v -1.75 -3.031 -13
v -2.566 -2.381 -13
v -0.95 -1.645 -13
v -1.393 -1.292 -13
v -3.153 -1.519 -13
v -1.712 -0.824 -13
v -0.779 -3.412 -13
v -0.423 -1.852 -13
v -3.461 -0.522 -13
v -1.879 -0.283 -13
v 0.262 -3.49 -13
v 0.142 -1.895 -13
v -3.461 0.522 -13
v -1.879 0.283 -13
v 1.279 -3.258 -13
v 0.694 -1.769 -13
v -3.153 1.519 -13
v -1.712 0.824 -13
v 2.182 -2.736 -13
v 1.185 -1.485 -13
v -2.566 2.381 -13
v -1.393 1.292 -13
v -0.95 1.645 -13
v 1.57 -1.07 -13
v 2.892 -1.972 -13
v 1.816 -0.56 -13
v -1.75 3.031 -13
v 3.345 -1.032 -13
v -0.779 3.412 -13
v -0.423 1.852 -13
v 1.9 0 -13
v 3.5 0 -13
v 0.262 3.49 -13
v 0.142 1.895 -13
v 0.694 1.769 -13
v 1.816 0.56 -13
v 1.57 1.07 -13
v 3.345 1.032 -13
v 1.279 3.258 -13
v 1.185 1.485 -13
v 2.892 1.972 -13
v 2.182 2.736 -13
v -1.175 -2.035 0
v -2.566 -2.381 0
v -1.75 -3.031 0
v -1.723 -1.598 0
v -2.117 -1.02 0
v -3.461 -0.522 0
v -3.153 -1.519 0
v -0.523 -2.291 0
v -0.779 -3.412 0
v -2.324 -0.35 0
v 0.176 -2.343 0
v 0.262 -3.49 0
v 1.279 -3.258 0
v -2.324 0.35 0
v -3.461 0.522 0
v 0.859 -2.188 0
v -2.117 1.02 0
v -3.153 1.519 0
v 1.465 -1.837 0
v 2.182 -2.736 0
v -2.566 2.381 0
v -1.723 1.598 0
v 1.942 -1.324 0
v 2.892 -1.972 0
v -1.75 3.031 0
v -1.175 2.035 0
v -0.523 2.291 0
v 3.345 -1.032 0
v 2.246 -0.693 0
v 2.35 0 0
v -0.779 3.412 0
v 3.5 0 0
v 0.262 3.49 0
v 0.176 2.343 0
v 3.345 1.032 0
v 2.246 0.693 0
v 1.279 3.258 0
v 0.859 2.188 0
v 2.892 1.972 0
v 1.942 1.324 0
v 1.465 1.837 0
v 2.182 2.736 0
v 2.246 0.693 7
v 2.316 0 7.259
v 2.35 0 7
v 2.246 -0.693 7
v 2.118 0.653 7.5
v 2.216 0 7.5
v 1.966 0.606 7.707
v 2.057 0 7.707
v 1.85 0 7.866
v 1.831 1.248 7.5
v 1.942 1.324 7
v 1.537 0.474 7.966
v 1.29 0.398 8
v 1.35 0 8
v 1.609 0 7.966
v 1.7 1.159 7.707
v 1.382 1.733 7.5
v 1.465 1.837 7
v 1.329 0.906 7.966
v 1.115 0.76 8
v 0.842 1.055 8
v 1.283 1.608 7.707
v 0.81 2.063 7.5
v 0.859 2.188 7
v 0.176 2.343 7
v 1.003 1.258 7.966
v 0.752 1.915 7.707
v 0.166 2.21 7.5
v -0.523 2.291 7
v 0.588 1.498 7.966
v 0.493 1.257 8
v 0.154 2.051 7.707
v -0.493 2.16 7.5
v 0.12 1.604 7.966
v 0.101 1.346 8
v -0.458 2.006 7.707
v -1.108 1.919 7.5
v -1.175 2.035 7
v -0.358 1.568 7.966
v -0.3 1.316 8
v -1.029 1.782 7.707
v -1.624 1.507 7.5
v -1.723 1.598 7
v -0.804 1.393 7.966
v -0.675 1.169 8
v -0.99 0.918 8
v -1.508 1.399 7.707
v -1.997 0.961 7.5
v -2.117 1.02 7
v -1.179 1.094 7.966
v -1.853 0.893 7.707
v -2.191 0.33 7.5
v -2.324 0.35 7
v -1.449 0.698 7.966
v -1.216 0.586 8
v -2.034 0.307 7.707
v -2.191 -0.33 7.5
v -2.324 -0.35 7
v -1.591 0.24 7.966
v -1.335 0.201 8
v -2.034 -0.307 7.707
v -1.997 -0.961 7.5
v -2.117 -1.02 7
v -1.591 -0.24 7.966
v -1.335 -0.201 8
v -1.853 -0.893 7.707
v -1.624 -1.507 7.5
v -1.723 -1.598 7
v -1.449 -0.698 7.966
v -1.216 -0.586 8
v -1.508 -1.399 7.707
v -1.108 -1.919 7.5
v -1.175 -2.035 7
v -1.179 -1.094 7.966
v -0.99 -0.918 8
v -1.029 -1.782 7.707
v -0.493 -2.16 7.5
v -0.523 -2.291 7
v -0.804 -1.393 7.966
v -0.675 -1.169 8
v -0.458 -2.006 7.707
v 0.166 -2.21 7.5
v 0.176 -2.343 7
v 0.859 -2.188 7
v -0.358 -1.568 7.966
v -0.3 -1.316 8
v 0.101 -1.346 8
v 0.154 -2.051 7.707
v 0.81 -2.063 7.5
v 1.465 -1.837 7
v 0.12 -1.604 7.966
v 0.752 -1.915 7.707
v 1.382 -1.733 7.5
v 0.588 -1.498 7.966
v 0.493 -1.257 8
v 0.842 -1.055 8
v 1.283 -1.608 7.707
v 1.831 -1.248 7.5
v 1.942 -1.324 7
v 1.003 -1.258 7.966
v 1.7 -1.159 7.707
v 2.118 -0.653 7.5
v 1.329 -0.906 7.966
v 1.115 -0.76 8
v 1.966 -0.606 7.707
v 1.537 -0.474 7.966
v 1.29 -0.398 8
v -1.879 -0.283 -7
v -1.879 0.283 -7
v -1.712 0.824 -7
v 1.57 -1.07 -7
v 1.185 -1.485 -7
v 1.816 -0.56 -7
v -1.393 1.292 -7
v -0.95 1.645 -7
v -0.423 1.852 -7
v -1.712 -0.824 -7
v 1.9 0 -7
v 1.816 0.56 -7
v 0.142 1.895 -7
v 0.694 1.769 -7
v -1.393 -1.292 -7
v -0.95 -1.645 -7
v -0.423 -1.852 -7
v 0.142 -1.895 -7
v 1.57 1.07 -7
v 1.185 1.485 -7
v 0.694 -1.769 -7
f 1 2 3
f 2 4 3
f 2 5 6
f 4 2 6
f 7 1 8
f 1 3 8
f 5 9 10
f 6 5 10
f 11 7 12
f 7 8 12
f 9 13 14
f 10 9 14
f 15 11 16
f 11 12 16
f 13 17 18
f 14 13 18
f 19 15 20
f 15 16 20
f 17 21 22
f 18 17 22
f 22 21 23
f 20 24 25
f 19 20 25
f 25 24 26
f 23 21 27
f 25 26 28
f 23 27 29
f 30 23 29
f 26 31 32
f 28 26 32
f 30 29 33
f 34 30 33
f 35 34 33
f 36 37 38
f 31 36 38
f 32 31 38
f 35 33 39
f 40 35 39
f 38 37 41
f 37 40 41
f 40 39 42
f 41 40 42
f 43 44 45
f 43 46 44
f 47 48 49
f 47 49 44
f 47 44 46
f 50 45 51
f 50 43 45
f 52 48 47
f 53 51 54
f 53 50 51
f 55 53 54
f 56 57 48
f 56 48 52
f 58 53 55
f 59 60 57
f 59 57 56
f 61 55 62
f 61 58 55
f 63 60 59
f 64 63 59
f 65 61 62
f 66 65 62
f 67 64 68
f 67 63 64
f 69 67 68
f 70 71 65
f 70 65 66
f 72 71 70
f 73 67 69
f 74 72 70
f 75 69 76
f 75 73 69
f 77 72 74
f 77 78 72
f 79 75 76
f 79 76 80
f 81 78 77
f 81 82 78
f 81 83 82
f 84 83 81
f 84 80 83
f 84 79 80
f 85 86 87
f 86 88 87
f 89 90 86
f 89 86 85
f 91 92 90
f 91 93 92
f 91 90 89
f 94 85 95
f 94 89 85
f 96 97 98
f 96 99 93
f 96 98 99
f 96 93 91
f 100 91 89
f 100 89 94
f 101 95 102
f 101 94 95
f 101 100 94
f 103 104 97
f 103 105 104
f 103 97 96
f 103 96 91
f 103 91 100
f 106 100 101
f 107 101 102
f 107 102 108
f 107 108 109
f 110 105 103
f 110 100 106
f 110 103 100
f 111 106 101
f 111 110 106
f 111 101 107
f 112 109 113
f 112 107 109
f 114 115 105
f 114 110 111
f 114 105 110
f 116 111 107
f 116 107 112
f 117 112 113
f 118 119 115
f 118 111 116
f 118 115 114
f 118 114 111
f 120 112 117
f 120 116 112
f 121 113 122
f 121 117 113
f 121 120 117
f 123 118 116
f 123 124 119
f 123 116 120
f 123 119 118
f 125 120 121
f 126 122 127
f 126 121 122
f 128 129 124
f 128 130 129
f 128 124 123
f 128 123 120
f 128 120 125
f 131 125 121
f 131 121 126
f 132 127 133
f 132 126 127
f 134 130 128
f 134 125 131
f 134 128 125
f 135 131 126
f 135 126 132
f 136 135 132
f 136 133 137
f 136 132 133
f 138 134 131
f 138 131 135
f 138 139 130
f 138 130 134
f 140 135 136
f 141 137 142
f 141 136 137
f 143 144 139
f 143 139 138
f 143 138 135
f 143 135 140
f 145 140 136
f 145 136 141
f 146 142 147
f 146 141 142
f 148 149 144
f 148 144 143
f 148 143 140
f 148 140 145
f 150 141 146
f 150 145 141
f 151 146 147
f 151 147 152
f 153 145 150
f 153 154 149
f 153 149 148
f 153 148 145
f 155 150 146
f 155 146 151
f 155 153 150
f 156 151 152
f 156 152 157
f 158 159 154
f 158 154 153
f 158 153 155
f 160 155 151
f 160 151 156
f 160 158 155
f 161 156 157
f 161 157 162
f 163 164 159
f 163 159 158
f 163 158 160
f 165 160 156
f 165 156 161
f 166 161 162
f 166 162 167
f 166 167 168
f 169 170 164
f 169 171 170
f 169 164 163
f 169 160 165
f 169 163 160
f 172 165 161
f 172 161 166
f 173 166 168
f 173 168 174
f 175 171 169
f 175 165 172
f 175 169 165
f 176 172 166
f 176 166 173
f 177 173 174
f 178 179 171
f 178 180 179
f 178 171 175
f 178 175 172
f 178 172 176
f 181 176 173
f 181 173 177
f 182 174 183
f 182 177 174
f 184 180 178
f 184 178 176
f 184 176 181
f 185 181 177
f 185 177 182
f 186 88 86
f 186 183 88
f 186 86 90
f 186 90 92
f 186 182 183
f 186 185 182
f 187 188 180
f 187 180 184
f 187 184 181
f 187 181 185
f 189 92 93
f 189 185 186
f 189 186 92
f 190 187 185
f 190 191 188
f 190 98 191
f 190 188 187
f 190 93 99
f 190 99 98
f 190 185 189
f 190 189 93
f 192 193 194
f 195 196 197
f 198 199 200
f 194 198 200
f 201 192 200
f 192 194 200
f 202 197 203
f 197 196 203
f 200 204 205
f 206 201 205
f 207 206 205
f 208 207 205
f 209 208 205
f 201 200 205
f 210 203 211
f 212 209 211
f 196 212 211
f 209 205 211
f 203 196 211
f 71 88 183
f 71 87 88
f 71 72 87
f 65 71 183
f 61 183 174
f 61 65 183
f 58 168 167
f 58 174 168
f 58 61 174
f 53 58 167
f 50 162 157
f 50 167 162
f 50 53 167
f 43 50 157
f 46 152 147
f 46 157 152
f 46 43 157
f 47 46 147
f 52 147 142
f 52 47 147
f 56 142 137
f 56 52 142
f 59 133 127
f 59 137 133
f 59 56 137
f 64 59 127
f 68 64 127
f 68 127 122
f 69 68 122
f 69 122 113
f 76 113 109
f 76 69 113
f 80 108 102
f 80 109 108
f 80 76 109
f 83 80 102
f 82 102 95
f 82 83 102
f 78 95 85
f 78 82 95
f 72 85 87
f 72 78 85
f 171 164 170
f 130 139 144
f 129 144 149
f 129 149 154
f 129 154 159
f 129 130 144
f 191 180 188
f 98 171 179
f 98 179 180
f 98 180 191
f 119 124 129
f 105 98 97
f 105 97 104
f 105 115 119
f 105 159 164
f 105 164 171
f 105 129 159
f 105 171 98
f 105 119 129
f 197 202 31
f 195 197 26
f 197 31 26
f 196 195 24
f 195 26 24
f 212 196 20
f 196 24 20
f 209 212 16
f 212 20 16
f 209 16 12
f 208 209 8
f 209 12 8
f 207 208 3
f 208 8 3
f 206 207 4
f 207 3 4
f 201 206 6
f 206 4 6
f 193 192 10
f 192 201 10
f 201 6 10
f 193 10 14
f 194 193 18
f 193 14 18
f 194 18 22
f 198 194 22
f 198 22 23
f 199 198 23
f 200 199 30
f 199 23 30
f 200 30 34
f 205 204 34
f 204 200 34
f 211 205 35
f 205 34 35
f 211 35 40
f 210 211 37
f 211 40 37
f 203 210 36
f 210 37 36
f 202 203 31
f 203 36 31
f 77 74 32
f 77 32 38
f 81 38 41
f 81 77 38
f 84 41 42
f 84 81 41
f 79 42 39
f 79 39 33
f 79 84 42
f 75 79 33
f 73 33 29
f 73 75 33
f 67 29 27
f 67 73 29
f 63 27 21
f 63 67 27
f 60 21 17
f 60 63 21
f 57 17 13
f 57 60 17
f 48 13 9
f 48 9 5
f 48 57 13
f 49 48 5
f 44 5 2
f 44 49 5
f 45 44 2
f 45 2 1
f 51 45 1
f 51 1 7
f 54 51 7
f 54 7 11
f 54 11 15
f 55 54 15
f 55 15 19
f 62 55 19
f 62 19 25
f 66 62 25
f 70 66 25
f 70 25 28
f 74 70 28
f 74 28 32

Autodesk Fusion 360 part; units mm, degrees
sketch "Sketch1" plane through (0, 0, 0) normal (0, 0, 1) x (1, 0, 0)
  circle A0 centre (0, 0) radius 2.35
  circle A1 centre (0, 0) radius 3.5
  dimension "d1" = 4.7
  dimension "d4" = 7
extrude "Extrude1" add sketch "Sketch1" along normal blind 8 contours A0
extrude "Extrude2" add sketch "Sketch1" against normal blind 13 contours A0 | A1
ref_plane "WorkPlane1" through (0, 0, -15) normal (0, 0, 1) x (1, 0, 0)
sketch "Sketch2" plane through (0, 0, -15) normal (0, 0, 1) x (1, 0, 0)
  circle A0 centre (0, 0) radius 1.9
  dimension "d8" = 3.8
extrude "Extrude3" cut sketch "Sketch2" along normal blind 8
fillet "Fillet1" radius 1 1 edges at (-2.191, -0.8498, 8)
